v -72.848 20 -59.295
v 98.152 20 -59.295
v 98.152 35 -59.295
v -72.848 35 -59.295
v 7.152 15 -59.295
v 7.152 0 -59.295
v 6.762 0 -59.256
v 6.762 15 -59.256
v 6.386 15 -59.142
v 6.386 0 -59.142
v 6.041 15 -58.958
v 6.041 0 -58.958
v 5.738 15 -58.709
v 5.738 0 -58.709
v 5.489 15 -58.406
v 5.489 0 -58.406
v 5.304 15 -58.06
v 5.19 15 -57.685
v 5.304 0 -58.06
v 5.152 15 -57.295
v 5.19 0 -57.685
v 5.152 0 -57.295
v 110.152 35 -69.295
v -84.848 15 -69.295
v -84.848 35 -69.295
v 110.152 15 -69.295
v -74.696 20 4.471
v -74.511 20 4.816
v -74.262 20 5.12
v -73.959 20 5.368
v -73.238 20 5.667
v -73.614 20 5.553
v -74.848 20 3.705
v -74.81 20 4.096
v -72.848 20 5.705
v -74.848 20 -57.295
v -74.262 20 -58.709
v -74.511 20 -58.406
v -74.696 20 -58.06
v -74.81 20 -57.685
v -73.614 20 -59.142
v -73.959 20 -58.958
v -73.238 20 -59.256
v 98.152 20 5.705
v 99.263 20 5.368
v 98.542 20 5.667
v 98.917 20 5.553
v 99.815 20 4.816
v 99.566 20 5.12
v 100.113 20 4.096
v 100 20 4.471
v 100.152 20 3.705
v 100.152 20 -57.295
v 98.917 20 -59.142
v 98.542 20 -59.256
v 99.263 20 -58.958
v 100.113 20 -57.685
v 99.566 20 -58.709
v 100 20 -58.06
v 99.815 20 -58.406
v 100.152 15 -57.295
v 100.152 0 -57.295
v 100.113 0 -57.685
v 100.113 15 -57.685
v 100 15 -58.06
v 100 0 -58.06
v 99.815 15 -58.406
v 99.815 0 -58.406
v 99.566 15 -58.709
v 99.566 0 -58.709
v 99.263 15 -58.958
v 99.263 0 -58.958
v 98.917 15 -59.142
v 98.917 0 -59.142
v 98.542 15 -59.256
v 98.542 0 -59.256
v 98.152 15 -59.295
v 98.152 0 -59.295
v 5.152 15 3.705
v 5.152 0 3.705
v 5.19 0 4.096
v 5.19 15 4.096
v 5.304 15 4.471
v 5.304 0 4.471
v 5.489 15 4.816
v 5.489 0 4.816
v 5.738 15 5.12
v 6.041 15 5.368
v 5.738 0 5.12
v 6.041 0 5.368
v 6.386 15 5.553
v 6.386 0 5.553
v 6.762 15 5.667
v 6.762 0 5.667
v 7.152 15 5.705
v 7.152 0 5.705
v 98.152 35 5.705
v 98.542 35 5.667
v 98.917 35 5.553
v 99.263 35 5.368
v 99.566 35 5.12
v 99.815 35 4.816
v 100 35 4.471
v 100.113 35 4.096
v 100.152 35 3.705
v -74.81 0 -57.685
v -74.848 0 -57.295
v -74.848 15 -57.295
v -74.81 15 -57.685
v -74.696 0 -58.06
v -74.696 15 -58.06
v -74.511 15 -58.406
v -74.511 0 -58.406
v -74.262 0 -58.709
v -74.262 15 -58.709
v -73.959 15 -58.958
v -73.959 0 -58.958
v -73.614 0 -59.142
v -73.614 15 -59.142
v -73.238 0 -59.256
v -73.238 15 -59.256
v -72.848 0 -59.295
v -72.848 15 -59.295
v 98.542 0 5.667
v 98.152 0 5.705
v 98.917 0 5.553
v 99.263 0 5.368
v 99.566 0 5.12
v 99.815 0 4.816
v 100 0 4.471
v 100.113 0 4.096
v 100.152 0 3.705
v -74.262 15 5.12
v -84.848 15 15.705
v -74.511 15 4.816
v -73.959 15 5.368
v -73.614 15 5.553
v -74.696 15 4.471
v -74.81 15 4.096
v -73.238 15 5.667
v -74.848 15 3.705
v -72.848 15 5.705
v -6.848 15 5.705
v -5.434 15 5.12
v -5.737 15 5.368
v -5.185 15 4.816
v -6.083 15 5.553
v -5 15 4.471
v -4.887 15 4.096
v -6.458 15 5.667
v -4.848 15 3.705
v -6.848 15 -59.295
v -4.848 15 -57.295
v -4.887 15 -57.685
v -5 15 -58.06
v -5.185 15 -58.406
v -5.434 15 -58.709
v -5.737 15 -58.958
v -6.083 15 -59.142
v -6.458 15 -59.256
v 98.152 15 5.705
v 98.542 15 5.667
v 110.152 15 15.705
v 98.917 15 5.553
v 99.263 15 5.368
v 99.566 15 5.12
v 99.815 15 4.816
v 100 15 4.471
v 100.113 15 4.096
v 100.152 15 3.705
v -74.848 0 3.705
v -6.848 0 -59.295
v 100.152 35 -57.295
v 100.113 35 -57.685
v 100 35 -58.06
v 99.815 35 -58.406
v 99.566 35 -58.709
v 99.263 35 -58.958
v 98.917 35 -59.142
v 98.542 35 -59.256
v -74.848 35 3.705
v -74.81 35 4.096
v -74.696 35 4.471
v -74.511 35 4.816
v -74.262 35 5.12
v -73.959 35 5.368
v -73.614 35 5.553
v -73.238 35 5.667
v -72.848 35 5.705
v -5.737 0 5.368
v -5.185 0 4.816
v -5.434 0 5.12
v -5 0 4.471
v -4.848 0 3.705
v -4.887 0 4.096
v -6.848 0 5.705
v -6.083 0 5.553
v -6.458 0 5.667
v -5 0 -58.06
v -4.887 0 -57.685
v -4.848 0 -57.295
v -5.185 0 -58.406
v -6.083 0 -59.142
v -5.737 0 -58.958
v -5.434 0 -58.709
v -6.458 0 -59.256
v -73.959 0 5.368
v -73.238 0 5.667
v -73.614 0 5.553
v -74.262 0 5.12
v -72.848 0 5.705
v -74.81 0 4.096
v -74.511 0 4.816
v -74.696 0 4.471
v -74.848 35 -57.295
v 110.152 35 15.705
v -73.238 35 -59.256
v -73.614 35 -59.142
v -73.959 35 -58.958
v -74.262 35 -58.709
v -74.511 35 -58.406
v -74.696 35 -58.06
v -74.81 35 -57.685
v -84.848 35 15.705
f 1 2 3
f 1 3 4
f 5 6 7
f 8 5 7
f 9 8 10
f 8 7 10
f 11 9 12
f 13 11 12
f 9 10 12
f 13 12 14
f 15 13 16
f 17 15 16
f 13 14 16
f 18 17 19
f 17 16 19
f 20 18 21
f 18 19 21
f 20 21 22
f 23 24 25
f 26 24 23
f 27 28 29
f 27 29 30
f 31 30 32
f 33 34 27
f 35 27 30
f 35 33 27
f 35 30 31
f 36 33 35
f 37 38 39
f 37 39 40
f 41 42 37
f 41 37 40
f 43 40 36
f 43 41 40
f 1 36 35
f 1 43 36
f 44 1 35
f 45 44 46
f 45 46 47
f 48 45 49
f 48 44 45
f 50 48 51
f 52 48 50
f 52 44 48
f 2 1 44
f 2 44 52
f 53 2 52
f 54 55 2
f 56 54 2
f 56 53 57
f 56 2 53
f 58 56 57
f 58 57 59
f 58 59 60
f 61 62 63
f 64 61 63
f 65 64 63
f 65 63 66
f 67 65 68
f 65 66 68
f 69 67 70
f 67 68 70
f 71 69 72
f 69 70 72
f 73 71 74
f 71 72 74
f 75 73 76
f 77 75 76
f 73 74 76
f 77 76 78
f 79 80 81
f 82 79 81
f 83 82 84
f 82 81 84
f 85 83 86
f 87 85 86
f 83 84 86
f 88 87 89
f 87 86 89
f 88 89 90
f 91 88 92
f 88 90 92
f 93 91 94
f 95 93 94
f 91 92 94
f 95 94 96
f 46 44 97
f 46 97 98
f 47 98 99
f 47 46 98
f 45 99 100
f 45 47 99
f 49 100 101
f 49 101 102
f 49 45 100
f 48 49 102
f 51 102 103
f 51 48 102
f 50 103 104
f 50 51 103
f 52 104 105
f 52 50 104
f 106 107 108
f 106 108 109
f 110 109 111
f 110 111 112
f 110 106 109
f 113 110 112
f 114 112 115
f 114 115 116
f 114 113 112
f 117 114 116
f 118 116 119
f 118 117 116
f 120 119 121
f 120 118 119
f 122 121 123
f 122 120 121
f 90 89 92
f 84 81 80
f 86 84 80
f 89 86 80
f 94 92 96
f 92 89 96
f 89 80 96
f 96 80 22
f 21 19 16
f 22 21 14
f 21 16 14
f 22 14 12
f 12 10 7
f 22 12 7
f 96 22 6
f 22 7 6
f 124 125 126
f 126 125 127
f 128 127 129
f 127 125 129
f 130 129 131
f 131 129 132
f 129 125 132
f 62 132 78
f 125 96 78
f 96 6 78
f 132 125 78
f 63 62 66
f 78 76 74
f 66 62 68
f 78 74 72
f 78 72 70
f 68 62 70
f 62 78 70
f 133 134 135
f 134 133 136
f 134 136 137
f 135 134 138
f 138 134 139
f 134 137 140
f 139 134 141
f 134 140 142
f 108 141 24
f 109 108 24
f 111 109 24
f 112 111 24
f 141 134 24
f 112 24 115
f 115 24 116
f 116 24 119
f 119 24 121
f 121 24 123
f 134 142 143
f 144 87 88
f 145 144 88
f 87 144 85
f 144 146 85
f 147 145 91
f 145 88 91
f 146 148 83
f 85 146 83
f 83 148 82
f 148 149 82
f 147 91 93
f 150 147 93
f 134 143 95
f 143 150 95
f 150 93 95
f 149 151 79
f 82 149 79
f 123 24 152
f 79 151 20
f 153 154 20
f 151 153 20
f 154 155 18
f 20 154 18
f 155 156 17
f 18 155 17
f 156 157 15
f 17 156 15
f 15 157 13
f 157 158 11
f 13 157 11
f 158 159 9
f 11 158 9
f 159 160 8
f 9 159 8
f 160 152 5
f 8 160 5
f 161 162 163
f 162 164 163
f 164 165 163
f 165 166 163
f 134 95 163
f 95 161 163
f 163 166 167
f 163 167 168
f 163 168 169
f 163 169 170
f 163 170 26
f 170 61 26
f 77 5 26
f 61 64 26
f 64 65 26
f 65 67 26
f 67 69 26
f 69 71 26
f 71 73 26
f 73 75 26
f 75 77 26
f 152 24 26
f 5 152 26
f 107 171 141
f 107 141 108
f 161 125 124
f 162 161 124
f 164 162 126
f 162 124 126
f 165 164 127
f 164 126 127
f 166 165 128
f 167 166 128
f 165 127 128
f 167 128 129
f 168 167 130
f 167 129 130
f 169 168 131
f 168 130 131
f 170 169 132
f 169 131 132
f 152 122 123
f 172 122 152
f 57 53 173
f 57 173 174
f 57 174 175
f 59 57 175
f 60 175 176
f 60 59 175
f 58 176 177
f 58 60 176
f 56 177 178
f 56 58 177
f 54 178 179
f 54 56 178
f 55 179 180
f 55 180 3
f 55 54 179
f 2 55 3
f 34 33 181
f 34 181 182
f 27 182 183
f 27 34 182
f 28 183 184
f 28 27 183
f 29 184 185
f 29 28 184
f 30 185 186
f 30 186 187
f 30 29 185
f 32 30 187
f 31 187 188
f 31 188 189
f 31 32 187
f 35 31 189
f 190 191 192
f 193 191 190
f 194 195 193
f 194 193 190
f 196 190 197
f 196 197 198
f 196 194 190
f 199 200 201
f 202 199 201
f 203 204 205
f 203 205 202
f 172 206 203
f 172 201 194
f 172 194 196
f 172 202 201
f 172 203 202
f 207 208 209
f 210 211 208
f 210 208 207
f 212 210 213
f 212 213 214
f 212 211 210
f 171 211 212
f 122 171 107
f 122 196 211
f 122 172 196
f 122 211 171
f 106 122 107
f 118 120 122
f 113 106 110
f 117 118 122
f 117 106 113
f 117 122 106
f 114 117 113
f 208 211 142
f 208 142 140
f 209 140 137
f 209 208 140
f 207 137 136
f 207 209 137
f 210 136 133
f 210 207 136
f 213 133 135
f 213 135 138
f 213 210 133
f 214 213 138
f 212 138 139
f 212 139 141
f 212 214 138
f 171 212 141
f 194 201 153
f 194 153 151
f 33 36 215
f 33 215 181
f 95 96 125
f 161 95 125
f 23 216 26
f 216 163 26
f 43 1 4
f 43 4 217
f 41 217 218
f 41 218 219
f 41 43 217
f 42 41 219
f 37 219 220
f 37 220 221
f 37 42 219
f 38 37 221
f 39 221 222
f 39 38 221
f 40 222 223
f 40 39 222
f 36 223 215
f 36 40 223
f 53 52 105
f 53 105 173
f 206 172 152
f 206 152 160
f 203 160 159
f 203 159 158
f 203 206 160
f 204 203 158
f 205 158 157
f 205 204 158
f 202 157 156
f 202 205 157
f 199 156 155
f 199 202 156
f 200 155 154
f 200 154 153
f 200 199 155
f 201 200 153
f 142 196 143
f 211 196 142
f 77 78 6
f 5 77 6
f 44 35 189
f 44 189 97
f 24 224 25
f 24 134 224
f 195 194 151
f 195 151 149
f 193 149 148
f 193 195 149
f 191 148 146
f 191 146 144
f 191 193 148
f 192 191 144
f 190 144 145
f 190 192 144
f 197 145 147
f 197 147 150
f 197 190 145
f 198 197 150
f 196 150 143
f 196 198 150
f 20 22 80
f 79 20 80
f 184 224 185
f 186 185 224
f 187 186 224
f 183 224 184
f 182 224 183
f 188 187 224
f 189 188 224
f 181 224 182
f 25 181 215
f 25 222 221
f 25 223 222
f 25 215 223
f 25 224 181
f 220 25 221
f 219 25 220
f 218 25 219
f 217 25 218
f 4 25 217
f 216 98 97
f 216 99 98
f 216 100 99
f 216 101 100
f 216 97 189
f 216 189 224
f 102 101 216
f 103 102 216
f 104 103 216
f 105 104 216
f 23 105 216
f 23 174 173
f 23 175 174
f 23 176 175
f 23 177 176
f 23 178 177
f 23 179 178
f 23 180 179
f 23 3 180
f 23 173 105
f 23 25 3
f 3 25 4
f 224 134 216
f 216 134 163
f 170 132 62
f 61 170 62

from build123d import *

# Parameters (mm, degrees)
BOSS_EXTRUDE2_DEPTH   = 15
BOSS_EXTRUDE2_2_DEPTH = 15
SKETCH2_W             = 195
SKETCH2_H             = 85
BOSS_EXTRUDE3_DEPTH   = 5
SKETCH3_W             = 195
SKETCH3_H             = 85
BOSS_EXTRUDE4_DEPTH   = 15


with BuildPart() as part:
    # Sketch1 → Boss-Extrude2 (new body)
    with BuildSketch(Plane(origin=(0, 0, 0), x_dir=(1, 0, 0), z_dir=(0, 1, 0))):
        with BuildLine():
            Line((-74.848214286, -3.705357143), (-74.848214286, 57.294642857))
            ThreePointArc((-74.848214286, 57.294642857), (-74.262427848, 58.70885642), (-72.848214286, 59.294642857))
            Line((-72.848214286, 59.294642857), (-6.848214286, 59.294642857))
            ThreePointArc((-6.848214286, 59.294642857), (-5.434000723, 58.70885642), (-4.848214286, 57.294642857))
            Line((-4.848214286, 57.294642857), (-4.848214286, -3.705357143))
            ThreePointArc((-4.848214286, -3.705357143), (-5.434000723, -5.119570705), (-6.848214286, -5.705357143))
            Line((-6.848214286, -5.705357143), (-72.848214286, -5.705357143))
            ThreePointArc((-72.848214286, -5.705357143), (-74.262427848, -5.119570705), (-74.848214286, -3.705357143))
        make_face()
    extrude(amount=BOSS_EXTRUDE2_DEPTH)



with BuildPart() as body_2:
    # Sketch1 → Boss-Extrude2 2 (new body)
    with BuildSketch(Plane(origin=(0, 0, 0), x_dir=(1, 0, 0), z_dir=(0, 1, 0))):
        with BuildLine():
            Line((100.151785714, -3.705357143), (100.151785714, 57.294642857))
            ThreePointArc((100.151785714, 57.294642857), (99.565999277, 58.70885642), (98.151785714, 59.294642857))
            Line((98.151785714, 59.294642857), (7.151785714, 59.294642857))
            ThreePointArc((7.151785714, 59.294642857), (5.737572152, 58.70885642), (5.151785714, 57.294642857))
            Line((5.151785714, 57.294642857), (5.151785714, -3.705357143))
            ThreePointArc((5.151785714, -3.705357143), (5.737572152, -5.119570705), (7.151785714, -5.705357143))
            Line((7.151785714, -5.705357143), (98.151785714, -5.705357143))
            ThreePointArc((98.151785714, -5.705357143), (99.565999277, -5.119570705), (100.151785714, -3.705357143))
        make_face()
    extrude(amount=BOSS_EXTRUDE2_2_DEPTH)


with BuildPart() as part_1:
    add(part.part)

    add(body_2.part)  # Boss-Extrude3 merges body 2
    # Sketch2 → Boss-Extrude3 (add)
    with BuildSketch(Plane(origin=(0, 15, 0), x_dir=(1, 0, 0), z_dir=(0, 1, 0))):
        with Locations((12.651785714, 26.794642857)):
            Rectangle(SKETCH2_W, SKETCH2_H)
    extrude(amount=BOSS_EXTRUDE3_DEPTH)

    # Sketch3 → Boss-Extrude4 (add)
    with BuildSketch(Plane(origin=(0, 20, 0), x_dir=(1, 0, 0), z_dir=(0, 1, 0))):
        with Locations((12.651785714, 26.794642857)):
            Rectangle(SKETCH3_W, SKETCH3_H)
        with BuildLine():
            Line((-74.848214286, 57.294642857), (-74.848214286, -3.705357143))
            ThreePointArc((-74.848214286, -3.705357143), (-74.262427848, -5.119570705), (-72.848214286, -5.705357143))
            Line((-72.848214286, -5.705357143), (98.151785714, -5.705357143))
            ThreePointArc((98.151785714, -5.705357143), (99.565999277, -5.119570705), (100.151785714, -3.705357143))
            Line((100.151785714, -3.705357143), (100.151785714, 57.294642857))
            ThreePointArc((100.151785714, 57.294642857), (99.565999277, 58.70885642), (98.151785714, 59.294642857))
            Line((98.151785714, 59.294642857), (-72.848214286, 59.294642857))
            ThreePointArc((-72.848214286, 59.294642857), (-74.262427848, 58.70885642), (-74.848214286, 57.294642857))
        make_face(mode=Mode.SUBTRACT)
    extrude(amount=BOSS_EXTRUDE4_DEPTH)


solid = part_1.part
